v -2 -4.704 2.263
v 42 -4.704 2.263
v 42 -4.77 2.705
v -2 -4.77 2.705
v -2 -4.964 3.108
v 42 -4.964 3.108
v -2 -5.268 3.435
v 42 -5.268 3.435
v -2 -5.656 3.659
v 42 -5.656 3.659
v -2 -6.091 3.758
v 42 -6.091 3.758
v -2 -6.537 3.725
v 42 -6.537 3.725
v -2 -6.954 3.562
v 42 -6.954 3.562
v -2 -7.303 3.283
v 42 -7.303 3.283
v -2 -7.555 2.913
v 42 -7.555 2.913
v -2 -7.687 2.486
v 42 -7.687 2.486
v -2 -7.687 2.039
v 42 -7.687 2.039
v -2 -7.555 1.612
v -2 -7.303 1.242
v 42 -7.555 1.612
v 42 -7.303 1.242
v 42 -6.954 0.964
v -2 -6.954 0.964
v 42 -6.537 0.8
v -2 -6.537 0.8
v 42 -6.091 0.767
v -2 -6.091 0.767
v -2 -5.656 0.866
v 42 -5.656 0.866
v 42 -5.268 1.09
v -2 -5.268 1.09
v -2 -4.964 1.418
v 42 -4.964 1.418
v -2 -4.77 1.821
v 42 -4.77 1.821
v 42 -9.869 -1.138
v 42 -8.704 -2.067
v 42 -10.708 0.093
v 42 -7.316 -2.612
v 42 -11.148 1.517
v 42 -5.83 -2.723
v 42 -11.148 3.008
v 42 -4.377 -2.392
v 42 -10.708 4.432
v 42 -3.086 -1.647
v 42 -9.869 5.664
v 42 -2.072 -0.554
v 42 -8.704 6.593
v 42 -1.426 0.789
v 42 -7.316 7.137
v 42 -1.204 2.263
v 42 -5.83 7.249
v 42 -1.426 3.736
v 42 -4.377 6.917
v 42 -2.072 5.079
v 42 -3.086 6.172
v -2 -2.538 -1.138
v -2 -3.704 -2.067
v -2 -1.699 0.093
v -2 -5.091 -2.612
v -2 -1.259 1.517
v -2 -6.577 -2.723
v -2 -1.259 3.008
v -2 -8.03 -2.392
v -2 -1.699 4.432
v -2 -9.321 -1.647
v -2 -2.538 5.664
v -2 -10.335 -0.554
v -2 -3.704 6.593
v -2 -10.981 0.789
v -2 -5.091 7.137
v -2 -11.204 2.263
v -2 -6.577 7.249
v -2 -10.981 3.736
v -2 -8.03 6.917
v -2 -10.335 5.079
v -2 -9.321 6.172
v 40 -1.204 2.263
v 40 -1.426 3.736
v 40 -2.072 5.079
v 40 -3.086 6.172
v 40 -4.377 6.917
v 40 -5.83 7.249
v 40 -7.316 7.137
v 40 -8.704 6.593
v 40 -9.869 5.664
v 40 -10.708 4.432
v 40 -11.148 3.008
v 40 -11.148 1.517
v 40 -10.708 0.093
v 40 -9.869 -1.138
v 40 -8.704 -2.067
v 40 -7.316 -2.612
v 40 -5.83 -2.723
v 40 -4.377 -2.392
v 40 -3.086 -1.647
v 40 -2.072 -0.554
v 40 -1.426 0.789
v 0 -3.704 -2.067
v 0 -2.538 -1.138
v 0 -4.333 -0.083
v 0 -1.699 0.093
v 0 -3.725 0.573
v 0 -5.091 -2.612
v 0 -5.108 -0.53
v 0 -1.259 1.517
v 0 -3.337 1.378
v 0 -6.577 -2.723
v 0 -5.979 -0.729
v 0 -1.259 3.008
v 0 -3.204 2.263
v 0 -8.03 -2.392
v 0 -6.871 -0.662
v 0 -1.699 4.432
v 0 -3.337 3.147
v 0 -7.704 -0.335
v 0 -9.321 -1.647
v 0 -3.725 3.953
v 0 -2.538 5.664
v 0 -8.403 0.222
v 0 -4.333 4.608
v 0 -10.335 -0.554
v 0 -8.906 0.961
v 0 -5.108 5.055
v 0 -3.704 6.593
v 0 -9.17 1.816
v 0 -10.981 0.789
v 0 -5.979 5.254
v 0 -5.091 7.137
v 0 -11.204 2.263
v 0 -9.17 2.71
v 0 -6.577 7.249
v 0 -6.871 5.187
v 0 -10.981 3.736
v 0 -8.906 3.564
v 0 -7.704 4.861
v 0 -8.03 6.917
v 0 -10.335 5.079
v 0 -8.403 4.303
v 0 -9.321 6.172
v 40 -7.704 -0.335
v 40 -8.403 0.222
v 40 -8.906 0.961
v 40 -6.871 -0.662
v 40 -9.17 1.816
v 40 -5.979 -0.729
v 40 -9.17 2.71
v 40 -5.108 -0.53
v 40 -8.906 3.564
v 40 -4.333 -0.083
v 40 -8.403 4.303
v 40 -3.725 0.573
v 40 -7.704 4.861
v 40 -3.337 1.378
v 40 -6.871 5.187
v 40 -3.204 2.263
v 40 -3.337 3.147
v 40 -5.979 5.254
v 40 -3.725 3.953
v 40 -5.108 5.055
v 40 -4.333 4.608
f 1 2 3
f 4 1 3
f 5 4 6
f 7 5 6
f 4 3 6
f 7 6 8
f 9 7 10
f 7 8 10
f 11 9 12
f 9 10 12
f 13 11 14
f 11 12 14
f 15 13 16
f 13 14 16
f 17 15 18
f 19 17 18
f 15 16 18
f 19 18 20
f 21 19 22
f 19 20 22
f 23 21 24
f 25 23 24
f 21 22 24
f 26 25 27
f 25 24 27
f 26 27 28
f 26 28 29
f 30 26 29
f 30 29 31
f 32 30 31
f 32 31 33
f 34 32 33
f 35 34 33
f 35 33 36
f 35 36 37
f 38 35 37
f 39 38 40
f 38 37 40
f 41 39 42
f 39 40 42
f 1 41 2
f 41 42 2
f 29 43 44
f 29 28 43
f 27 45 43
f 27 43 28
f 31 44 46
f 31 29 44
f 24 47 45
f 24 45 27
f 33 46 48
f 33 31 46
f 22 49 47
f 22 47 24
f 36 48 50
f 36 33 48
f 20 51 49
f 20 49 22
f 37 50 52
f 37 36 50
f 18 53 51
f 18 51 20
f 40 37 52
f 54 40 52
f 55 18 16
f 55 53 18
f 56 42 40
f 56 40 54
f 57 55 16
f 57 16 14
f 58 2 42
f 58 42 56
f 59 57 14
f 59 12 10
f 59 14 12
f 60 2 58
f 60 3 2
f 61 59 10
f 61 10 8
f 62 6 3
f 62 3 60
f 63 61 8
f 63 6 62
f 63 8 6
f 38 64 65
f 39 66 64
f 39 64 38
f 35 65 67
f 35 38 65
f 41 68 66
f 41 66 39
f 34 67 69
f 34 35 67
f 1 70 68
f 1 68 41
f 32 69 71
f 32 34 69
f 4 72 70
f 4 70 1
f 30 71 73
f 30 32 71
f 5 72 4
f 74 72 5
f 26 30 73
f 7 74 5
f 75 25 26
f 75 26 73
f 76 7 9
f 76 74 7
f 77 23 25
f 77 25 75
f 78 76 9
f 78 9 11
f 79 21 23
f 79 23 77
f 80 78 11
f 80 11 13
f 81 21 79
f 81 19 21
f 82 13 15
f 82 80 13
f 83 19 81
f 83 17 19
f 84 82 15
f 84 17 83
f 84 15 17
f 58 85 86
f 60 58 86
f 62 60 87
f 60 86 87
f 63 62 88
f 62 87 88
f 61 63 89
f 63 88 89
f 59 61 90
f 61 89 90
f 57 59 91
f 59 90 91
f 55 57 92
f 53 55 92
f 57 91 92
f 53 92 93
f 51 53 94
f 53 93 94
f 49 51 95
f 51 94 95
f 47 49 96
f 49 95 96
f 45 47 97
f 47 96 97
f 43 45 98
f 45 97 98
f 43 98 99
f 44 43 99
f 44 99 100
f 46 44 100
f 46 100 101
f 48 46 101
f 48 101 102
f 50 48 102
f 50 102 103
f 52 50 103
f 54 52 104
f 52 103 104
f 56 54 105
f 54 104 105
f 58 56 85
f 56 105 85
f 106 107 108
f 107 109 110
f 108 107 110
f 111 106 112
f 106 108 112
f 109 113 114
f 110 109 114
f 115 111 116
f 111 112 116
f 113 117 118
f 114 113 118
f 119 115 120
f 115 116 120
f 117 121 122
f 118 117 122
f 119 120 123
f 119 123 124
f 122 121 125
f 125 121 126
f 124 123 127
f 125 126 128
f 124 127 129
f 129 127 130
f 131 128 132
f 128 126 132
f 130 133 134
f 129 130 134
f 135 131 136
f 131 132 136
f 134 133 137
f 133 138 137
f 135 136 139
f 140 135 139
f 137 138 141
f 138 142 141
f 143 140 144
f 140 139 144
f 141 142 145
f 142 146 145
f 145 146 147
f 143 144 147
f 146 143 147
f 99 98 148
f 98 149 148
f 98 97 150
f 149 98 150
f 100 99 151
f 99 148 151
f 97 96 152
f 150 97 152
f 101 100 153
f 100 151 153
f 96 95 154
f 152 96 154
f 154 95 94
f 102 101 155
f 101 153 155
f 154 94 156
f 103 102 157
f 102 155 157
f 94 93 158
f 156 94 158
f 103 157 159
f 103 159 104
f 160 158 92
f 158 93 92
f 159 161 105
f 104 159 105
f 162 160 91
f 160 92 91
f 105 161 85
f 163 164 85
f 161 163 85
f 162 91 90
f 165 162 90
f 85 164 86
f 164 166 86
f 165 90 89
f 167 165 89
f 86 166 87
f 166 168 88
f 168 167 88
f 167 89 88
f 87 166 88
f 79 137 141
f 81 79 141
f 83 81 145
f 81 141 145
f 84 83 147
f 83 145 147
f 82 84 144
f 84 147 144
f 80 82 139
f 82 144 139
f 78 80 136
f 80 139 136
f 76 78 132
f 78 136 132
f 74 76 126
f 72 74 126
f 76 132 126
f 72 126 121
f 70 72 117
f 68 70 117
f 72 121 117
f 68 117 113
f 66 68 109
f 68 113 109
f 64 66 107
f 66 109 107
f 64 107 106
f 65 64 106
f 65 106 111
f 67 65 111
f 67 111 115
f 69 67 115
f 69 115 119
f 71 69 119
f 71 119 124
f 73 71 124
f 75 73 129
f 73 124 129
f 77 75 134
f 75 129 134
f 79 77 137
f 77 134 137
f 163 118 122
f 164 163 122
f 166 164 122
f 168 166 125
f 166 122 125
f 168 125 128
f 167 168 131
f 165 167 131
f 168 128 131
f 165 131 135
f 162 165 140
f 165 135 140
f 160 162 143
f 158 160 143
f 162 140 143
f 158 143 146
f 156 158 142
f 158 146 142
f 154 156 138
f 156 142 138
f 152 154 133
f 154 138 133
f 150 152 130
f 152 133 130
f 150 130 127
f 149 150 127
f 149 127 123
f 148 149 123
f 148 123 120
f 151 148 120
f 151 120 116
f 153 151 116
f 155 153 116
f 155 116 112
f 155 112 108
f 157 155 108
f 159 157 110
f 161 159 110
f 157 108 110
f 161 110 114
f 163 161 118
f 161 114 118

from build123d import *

# Parameters (mm, degrees)
F0_R     = 3
F1_DEPTH = 40
F2_R     = 5
F2_R_2   = 3
F3_DEPTH = 2
F4_R     = 5
F4_R_2   = 3
F5_DEPTH = 2
F6_R     = 1.5
F7_DEPTH = 44


with BuildPart() as f1:
    # F0 (on Right) → F1 (new body)
    with BuildSketch(Plane.YZ):
        with Locations((-6.2035736628, 2.2626414429)):
            Circle(F0_R)
    extrude(amount=F1_DEPTH)

    # F2 (on face) → F3 (join)
    with BuildSketch(Plane.YZ.offset(40)):
        with Locations((-6.2035736628, 2.2626414429)):
            Circle(F2_R)
        with Locations((-6.2035736628, 2.2626414429)):
            Circle(F2_R_2, mode=Mode.SUBTRACT)
        with Locations((-6.2035736628, 2.2626414429)):
            Circle(F2_R_2)
    extrude(amount=F3_DEPTH)

    # F4 (on face) → F5 (join)
    with BuildSketch(Plane(origin=(0, 0, 0), x_dir=(0, -1, 0), z_dir=(-1, 0, 0))):
        with Locations((6.2035736628, 2.2626414429)):
            Circle(F4_R)
        with Locations((6.2035736628, 2.2626414429)):
            Circle(F4_R_2, mode=Mode.SUBTRACT)
        with Locations((6.2035736628, 2.2626414429)):
            Circle(F4_R_2)
    extrude(amount=F5_DEPTH)

    # F6 (on face) → F7 (cut)
    with BuildSketch(Plane.YZ.offset(42)):
        with Locations((-6.2035736628, 2.2626414429)):
            Circle(F6_R)
    extrude(amount=-F7_DEPTH, mode=Mode.SUBTRACT)


solid = f1.part
